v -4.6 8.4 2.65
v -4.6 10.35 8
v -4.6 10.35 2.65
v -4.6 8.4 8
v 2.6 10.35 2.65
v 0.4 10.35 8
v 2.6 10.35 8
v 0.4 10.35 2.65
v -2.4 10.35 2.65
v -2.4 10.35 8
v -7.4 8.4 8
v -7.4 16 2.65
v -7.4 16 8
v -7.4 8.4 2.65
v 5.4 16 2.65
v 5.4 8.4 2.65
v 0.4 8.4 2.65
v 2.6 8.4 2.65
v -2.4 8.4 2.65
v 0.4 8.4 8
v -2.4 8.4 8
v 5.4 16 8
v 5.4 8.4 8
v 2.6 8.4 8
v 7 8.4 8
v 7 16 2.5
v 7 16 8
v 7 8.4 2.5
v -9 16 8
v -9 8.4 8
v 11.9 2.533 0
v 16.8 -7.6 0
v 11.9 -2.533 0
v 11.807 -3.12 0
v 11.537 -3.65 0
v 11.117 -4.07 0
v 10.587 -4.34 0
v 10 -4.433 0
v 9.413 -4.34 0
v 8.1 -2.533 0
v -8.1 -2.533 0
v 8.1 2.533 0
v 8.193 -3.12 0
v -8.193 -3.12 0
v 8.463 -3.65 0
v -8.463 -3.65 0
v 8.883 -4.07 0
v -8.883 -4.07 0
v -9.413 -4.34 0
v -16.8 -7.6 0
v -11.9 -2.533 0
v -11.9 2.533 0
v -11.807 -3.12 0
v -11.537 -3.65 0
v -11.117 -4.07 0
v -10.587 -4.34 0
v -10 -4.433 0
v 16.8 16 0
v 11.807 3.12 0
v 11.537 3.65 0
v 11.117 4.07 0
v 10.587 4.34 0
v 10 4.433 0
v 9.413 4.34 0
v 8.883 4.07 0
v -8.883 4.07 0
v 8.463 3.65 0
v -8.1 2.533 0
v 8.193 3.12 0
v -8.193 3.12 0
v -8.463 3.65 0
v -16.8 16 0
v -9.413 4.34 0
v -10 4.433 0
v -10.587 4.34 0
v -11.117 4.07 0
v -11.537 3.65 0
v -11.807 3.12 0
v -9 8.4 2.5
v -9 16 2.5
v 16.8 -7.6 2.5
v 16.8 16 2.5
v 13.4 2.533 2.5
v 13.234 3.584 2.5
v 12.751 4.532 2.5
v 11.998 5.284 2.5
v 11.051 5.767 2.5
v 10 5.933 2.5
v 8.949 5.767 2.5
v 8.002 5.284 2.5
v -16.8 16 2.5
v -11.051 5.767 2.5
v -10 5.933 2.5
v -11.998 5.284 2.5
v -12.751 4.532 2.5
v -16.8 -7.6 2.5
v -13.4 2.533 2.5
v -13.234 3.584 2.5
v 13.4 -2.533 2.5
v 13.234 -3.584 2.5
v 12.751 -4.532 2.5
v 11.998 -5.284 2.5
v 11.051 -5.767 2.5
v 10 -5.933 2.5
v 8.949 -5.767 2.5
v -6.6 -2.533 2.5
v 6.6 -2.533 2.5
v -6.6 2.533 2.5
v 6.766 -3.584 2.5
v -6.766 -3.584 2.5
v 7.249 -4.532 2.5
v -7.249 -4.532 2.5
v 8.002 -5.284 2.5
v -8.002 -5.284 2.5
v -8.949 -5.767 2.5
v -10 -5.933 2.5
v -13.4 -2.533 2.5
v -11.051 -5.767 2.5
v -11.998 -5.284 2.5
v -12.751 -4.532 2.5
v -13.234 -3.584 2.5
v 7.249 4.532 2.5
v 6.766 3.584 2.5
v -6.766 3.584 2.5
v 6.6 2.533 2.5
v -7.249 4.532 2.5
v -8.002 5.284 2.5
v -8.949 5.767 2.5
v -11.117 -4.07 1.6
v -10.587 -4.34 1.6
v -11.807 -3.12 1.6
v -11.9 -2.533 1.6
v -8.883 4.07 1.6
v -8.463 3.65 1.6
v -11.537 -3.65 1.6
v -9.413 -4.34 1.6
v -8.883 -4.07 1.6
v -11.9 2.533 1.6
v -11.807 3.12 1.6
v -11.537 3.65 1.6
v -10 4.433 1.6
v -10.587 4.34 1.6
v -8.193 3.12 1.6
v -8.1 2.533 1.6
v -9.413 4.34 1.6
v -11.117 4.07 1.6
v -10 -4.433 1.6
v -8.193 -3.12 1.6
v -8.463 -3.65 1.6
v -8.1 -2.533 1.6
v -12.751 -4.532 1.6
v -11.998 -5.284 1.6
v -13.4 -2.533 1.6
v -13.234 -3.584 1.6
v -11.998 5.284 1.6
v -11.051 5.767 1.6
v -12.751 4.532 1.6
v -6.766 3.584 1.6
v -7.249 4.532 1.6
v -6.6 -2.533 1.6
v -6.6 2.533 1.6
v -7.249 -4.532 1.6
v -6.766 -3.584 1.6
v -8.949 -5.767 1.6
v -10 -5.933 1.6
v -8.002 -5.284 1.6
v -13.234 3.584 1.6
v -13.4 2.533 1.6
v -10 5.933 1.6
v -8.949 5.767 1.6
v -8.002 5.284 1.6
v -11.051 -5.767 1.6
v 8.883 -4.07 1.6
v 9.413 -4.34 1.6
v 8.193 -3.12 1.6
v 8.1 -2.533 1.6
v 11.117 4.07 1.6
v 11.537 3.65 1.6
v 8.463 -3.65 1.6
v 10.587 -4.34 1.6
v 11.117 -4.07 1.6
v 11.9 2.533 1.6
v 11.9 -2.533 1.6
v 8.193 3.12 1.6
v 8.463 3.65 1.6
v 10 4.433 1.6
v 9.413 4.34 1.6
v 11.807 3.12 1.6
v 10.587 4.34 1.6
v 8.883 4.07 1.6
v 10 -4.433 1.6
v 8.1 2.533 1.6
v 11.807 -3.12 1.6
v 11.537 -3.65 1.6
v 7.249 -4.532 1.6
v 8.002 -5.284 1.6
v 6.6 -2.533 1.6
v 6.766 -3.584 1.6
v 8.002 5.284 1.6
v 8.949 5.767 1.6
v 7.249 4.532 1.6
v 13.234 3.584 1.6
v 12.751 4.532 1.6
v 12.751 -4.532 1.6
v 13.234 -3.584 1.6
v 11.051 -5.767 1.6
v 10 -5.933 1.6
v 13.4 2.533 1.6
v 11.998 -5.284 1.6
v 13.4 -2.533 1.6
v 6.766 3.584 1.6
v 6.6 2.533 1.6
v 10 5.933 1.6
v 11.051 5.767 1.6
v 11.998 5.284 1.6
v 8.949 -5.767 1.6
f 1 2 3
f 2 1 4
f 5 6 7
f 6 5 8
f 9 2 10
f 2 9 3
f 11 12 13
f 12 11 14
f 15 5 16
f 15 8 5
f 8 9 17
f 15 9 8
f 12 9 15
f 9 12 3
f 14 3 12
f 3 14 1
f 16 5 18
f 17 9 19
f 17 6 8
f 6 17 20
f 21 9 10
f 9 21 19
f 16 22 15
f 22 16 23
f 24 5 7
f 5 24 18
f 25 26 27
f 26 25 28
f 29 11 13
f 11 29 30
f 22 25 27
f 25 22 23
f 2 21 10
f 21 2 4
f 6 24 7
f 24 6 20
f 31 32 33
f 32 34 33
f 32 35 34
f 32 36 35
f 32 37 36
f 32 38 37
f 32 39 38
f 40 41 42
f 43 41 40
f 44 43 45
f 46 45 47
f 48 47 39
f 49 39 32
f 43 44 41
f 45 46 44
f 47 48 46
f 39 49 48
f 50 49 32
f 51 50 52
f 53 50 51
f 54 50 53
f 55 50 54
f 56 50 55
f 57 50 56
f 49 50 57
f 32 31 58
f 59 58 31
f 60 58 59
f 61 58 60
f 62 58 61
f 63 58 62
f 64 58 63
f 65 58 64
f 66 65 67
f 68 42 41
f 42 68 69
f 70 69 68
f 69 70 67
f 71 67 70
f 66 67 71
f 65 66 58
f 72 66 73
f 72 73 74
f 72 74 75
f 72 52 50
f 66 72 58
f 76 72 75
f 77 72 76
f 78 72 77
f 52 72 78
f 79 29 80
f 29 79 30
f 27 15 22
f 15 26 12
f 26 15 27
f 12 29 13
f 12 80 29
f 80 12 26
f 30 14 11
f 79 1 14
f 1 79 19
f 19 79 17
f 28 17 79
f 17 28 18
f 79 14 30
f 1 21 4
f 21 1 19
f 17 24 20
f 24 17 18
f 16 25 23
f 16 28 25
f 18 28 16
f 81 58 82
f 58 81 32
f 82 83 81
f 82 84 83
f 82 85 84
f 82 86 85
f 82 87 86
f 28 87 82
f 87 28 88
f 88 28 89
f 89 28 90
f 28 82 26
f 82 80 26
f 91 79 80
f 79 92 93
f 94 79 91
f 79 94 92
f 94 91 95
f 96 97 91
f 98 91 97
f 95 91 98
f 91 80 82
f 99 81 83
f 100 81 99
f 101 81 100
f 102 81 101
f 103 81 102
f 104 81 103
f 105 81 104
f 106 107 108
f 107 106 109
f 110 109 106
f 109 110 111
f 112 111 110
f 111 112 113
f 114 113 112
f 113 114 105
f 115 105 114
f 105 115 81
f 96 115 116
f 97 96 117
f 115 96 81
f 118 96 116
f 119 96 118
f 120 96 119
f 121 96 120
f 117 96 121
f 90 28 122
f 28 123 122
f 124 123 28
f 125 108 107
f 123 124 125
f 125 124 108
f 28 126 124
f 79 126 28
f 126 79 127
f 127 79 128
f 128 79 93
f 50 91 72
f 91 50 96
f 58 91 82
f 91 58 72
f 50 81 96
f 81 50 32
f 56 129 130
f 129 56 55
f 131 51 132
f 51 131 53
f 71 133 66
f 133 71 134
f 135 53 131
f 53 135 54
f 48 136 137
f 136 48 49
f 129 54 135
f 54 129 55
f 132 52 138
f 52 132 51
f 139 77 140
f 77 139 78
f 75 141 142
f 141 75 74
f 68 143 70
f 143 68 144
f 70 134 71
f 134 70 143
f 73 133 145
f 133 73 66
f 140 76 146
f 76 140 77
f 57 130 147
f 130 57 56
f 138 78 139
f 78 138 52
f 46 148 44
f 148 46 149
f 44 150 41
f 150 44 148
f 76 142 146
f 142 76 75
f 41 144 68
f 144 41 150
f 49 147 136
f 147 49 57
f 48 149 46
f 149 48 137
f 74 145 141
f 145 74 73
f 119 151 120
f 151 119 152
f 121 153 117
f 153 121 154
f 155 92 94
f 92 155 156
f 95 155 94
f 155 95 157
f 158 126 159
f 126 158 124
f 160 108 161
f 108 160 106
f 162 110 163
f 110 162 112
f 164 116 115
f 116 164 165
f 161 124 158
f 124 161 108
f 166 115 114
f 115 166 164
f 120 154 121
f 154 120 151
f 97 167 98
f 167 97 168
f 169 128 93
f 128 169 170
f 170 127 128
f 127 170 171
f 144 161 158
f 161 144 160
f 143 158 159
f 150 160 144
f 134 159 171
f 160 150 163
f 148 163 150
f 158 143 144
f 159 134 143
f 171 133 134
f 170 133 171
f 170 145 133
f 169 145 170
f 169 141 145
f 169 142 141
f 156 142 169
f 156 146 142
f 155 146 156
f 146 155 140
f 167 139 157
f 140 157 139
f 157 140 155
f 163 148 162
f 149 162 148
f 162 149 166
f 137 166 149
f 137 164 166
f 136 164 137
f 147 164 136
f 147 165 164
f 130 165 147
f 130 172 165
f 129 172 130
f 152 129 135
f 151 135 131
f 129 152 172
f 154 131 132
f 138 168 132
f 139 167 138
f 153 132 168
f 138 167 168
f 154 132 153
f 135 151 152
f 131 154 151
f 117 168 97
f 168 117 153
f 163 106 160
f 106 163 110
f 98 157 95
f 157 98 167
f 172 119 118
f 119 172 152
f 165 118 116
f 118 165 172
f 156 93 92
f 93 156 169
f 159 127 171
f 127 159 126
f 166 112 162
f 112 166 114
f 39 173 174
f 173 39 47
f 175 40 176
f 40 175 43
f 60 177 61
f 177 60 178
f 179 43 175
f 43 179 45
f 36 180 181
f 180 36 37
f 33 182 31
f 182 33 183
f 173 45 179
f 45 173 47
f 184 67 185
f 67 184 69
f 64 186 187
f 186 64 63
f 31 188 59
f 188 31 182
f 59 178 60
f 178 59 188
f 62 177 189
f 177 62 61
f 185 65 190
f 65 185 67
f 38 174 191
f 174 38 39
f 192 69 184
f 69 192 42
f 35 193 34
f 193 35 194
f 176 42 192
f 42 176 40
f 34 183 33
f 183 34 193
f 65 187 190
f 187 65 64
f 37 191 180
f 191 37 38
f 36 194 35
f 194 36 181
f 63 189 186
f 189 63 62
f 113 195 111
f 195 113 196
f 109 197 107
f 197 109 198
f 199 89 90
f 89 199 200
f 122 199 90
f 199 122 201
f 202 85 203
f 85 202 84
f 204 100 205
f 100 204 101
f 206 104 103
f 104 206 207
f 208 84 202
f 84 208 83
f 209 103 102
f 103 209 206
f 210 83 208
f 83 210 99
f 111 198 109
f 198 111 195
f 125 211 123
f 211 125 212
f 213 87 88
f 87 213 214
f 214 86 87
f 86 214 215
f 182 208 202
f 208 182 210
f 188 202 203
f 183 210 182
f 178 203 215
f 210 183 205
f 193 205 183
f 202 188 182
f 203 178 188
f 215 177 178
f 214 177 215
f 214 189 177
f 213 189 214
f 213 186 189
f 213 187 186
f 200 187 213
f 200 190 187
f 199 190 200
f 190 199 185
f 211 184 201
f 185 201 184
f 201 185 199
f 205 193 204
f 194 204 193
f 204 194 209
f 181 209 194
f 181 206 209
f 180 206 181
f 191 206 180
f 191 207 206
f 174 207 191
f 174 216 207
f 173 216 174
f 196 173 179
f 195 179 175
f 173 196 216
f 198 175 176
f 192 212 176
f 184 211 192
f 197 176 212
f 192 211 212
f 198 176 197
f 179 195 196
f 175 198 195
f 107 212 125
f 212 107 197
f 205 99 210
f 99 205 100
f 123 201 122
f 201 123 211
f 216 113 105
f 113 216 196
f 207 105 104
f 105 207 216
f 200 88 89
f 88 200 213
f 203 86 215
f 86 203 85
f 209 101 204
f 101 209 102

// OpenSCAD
$fn=20;

TOR_DIAM            = 3+0.8;
TOR_CAB_DIAM        = 6+0.8;
TOR_DIST_TOP        = 16;

MOTOR_CENTRO_DIAM   = 32;

SWITCH_LARGO        = 12.8;
SWITCH_ANCHO        = 5.7;
SWITCH_ALTO         = 6;
SWITCH_PINS_TOPE    = 2;

BASE_AGUJEROS_TOR   = 20;
BASE_LARGO          = BASE_AGUJEROS_TOR+TOR_DIAM*2+3*2;
BASE_ANCHO          = TOR_DIST_TOP+TOR_DIAM/1.5*3;
BASE_ESPESOR        = 2.5;
BASE_ESPESOR_TOR    = 1.6;

module SwitchHolder()
{
    difference() {
        union() {
            translate([0, 0, (BASE_ESPESOR+SWITCH_ANCHO-0.2)/2]) cube([SWITCH_LARGO+BASE_ESPESOR_TOR*2, BASE_ESPESOR_TOR+SWITCH_ALTO, BASE_ESPESOR+SWITCH_ANCHO-0.2], center=true);
        }
        translate([0,-SWITCH_ANCHO/2+1,SWITCH_ALTO/2+BASE_ESPESOR]) rotate([-90,0,0]) # union() {
            translate([0,0,SWITCH_ALTO/2]) cube([SWITCH_LARGO, SWITCH_ANCHO, SWITCH_ALTO], center=true);
            for(i=[-1,0,1])
                translate([5*i, 0, -BASE_ESPESOR/2]) cube([2.8, SWITCH_ANCHO, BASE_ESPESOR], center=true);
        }
    }
}

// -(BASE_LARGO/2-SWITCH_LARGO/2-BASE_ESPESOR/2), SWITCH_ALTO+BASE_ESPESOR_TOR, SWITCH_ANCHO/2+BASE_ESPESOR


module YAxisSoporteEndstop()
{
    difference() {
        union() {
            translate([0, TOR_DIST_TOP-BASE_ANCHO/2, BASE_ESPESOR/2]) cube([BASE_LARGO, BASE_ANCHO, BASE_ESPESOR], center=true);
            translate([-1, TOR_DIST_TOP-(SWITCH_ALTO+1.6)/2,0]) SwitchHolder();
        }
        for(i=[-1, 1]) {
            translate([BASE_AGUJEROS_TOR/2*i, 0, 0]) {
                # hull() 
                    for(i=[-1, 1])
                        translate([0, TOR_DIAM/1.5*i, 0]) cylinder(h=BASE_ESPESOR, d=TOR_DIAM);
                # hull() 
                    for(i=[-1, 1])
                        translate([0, TOR_DIAM/1.5*i, BASE_ESPESOR_TOR]) cylinder(h=BASE_ESPESOR_TOR, d=TOR_CAB_DIAM);
            }
        }
    }
}

YAxisSoporteEndstop();
//SwitchHolder();
